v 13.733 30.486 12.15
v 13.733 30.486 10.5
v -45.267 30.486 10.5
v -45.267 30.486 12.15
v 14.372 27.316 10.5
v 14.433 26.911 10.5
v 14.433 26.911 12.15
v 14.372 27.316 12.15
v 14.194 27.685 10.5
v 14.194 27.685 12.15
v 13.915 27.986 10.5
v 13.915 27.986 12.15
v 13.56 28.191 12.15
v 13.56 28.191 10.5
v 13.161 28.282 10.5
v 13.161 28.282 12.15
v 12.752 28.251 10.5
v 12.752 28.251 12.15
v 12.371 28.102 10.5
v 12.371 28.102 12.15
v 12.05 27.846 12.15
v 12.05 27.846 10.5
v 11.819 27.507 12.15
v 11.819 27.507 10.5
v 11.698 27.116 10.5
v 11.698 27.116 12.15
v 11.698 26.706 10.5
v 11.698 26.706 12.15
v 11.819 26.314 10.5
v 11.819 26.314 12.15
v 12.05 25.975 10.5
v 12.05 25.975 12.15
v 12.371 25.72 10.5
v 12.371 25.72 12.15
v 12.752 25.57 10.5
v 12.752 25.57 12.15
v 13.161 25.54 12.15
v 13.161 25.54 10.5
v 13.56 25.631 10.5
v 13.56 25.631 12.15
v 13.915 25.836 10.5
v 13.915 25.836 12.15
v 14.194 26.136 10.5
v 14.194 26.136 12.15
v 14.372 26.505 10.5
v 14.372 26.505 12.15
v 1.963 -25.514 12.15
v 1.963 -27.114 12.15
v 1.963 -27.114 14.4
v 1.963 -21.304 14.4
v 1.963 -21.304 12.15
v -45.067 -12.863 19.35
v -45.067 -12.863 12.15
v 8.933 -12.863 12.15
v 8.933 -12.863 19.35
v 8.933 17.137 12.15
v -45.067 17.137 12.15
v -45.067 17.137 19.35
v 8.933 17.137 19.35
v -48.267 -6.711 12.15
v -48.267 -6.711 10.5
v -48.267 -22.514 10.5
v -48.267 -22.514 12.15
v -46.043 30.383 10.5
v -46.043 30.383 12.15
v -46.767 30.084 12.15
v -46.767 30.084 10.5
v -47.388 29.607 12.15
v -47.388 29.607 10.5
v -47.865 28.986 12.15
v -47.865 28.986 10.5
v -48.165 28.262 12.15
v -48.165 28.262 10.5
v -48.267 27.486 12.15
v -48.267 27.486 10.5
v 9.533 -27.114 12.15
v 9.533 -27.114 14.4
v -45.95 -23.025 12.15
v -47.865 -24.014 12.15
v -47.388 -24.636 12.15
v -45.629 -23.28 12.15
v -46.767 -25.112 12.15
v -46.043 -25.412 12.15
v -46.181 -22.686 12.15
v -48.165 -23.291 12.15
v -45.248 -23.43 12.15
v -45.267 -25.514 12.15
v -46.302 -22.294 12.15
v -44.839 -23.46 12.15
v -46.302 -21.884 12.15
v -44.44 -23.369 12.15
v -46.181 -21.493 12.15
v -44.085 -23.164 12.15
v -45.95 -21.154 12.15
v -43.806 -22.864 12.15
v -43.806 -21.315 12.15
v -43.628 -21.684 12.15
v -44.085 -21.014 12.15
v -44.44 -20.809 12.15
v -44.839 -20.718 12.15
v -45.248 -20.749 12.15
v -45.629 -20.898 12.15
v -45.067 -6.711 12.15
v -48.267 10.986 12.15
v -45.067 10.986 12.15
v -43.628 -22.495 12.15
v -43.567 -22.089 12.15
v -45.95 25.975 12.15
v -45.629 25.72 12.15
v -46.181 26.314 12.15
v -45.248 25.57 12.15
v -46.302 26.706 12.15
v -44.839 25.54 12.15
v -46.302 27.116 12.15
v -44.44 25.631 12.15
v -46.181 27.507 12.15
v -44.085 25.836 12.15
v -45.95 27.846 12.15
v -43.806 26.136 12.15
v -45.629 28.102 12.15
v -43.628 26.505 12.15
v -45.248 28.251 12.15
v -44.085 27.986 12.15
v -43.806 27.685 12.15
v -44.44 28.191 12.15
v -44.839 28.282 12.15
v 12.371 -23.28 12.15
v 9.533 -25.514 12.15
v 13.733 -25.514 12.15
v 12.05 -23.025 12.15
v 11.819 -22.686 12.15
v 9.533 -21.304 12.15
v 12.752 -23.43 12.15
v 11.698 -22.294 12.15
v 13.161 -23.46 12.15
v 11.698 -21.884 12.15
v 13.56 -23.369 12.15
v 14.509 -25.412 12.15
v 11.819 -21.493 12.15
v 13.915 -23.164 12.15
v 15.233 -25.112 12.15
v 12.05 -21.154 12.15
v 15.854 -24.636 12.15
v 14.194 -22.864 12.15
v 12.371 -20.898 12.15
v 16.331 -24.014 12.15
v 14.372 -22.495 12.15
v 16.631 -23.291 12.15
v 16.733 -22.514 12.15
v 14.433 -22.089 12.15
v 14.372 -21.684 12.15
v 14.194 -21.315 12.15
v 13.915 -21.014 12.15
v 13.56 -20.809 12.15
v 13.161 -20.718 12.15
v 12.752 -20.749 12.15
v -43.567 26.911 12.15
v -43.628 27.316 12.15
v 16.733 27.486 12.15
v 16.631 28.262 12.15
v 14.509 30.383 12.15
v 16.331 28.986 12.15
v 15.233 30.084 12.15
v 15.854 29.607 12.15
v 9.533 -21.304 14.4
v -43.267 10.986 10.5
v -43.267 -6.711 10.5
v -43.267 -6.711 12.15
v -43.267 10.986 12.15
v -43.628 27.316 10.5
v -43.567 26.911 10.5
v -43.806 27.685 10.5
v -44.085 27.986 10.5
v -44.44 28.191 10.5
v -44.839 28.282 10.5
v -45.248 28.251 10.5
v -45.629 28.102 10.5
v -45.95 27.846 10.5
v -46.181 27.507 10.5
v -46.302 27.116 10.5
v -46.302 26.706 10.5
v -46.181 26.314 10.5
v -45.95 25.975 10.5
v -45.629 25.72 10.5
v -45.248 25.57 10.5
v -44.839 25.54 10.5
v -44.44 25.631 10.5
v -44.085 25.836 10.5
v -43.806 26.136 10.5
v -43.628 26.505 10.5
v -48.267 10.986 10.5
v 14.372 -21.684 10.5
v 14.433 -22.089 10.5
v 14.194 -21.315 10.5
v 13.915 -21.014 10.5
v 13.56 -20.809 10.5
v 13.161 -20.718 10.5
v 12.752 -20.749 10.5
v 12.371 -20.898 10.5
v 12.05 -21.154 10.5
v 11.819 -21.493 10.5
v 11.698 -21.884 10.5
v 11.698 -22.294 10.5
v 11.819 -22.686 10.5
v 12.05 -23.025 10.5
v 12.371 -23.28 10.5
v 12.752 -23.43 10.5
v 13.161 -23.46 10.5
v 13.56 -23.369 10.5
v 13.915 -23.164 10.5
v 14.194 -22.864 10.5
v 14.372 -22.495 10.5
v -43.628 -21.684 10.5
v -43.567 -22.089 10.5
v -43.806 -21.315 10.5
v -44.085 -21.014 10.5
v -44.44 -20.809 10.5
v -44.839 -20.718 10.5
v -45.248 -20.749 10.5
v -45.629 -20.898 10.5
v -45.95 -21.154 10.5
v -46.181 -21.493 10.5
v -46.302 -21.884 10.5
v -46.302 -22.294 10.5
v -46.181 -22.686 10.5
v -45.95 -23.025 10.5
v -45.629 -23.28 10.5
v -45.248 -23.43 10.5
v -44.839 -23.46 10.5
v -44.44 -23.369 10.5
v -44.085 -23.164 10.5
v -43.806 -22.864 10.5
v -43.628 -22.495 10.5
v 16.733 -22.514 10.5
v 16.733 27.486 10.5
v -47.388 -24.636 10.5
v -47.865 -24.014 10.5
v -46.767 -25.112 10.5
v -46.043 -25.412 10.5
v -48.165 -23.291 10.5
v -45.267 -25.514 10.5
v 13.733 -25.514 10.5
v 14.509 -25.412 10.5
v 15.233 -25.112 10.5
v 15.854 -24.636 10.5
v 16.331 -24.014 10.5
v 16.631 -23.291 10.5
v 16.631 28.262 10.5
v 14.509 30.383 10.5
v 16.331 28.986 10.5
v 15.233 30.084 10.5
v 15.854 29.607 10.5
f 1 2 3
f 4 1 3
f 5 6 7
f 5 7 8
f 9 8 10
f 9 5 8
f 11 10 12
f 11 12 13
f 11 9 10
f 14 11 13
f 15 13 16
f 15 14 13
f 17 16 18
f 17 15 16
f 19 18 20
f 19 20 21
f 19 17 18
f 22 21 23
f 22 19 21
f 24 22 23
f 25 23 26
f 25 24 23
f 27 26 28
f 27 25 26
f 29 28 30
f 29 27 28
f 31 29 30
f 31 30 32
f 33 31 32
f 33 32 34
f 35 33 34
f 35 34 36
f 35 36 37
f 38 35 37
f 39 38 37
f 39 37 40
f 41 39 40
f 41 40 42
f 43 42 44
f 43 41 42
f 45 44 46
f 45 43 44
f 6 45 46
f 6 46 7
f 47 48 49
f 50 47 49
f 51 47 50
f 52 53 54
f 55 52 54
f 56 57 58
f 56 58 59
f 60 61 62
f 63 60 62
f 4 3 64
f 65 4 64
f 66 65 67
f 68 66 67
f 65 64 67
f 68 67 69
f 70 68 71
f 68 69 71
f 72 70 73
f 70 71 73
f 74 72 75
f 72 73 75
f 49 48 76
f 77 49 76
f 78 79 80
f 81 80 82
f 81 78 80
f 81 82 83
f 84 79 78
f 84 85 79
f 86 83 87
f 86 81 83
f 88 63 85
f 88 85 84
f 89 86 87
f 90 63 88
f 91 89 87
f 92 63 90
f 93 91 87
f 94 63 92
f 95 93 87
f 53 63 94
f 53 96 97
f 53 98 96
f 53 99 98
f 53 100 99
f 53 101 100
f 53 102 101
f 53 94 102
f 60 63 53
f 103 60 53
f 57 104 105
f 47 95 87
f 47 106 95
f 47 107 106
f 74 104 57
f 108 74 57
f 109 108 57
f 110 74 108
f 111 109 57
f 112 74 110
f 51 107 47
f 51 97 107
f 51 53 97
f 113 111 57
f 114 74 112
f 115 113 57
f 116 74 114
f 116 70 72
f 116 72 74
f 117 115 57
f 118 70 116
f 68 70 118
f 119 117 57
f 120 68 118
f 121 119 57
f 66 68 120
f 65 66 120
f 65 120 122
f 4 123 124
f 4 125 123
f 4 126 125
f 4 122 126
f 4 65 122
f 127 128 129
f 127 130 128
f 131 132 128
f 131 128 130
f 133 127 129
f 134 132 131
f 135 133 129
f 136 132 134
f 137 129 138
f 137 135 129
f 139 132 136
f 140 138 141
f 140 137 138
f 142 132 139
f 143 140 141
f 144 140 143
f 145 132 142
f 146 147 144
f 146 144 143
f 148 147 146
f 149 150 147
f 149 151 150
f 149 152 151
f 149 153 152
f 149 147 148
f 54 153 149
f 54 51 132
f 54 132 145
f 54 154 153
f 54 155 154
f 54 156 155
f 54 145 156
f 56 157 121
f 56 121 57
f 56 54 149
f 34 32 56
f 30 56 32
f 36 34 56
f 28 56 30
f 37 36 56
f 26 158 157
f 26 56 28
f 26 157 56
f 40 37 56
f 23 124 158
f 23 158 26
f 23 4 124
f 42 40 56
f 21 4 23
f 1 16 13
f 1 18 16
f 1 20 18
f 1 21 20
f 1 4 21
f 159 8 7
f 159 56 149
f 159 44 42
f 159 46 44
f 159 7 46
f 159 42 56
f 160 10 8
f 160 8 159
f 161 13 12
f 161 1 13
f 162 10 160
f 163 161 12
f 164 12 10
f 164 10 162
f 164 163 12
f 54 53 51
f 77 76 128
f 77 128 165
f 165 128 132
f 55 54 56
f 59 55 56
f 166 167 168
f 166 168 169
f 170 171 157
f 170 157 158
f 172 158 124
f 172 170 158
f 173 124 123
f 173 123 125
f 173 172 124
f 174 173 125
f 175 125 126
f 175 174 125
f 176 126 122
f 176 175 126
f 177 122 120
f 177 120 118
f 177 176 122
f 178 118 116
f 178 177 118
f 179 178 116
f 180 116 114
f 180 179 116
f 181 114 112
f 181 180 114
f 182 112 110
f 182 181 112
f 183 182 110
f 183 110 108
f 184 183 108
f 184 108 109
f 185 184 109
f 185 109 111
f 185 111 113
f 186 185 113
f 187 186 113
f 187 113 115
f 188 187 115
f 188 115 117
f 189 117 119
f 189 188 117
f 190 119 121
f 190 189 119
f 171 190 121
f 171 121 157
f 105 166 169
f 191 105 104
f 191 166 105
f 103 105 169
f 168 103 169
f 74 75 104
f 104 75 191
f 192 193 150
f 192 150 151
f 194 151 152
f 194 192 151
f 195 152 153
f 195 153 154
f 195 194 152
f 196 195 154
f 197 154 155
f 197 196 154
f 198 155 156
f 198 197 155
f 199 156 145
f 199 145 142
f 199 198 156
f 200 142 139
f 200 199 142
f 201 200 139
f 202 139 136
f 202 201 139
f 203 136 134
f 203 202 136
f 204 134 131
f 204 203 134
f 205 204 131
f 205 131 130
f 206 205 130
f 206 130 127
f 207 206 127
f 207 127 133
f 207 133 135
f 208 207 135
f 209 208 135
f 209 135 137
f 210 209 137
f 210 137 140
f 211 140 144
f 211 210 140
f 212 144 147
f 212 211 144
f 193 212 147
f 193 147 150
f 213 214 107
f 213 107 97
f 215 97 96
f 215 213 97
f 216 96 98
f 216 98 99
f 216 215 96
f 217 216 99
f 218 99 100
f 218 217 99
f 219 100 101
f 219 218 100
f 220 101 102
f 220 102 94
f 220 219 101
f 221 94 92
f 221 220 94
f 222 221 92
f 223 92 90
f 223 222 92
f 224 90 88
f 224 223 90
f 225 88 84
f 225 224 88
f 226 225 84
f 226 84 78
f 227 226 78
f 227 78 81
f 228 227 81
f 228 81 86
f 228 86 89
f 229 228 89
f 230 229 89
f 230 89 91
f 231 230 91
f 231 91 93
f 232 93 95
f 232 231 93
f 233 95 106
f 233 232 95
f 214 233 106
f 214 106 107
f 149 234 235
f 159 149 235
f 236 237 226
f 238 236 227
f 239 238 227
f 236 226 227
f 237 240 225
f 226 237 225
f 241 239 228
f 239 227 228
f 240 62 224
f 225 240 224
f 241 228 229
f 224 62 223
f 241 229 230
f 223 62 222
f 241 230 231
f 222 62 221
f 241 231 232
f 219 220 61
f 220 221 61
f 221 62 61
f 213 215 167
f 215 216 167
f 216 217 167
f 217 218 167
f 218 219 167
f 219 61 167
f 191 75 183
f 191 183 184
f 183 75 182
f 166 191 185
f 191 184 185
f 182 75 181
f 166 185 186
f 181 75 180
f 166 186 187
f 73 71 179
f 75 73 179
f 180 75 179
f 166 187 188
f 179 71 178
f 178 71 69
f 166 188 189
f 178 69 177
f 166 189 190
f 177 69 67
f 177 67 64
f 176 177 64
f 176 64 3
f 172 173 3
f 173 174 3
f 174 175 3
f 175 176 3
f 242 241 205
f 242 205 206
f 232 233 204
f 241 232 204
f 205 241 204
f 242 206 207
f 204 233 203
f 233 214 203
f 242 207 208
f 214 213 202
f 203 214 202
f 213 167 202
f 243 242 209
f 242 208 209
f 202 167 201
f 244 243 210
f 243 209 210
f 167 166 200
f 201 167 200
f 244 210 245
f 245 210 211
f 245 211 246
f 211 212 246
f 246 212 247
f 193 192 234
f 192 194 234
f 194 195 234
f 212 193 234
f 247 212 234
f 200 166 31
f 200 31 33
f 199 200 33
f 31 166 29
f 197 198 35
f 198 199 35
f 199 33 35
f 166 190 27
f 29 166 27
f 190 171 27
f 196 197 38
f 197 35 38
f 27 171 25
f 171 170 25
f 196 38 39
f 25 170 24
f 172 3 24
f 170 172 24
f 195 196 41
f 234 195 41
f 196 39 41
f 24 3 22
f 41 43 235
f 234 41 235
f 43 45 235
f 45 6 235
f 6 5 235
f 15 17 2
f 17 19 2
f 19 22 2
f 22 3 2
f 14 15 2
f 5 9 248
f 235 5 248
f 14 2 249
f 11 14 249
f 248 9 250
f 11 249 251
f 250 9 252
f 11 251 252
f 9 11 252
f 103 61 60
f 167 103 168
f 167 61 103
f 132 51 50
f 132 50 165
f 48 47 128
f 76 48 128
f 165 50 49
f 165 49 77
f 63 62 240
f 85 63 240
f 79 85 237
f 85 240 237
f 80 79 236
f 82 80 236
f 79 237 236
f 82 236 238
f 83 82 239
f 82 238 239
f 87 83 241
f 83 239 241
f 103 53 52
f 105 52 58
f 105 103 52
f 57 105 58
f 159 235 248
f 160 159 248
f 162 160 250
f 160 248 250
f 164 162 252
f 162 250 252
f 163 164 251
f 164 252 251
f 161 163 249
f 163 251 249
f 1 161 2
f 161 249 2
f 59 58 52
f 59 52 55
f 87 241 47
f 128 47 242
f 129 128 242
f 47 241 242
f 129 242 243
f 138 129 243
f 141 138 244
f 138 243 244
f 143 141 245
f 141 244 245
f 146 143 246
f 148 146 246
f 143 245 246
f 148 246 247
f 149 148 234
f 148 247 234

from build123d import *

# Parameters (mm, degrees)
SKETCH_R     = 1.375
PAD_DEPTH    = 1.65
SKETCH001_W  = 54
SKETCH001_H  = 30
PAD001_DEPTH = 7.2
SKETCH002_W  = 7.57
SKETCH002_H  = 5.81
PAD002_DEPTH = 2.25


with BuildPart() as part:
    # Sketch (on Face4 of Binder) → Pad (new body)
    with BuildSketch(Plane.XY.offset(10.5)):
        with BuildLine():
            Line((-48.266962, 27.485719), (-48.266962, 10.985719))
            Line((-43.266962, 10.985719), (-48.266962, 10.985719))
            Line((-43.266962, -6.711357), (-43.266962, 10.985719))
            Line((-48.266962, -6.711357), (-43.266962, -6.711357))
            Line((-48.266962, -6.711357), (-48.266967, -22.514281))
            ThreePointArc((-48.266967, -22.514281), (-47.388287, -24.635602), (-45.266967, -25.514281))
            Line((-45.266967, -25.514281), (13.733038, -25.514281))
            ThreePointArc((13.733038, -25.514281), (15.854358, -24.635602), (16.733038, -22.514281))
            Line((16.733038, -22.514281), (16.733038, 27.485719))
            ThreePointArc((16.733038, 27.485719), (15.854358, 29.607039), (13.733038, 30.485719))
            Line((13.733038, 30.485719), (-45.266962, 30.485719))
            ThreePointArc((-45.266962, 30.485719), (-47.388282, 29.607039), (-48.266962, 27.485719))
        make_face()
        with Locations((-44.941962, 26.910719)):
            Circle(SKETCH_R, mode=Mode.SUBTRACT)
        with Locations((13.058038, 26.910719)):
            Circle(SKETCH_R, mode=Mode.SUBTRACT)
        with Locations((13.058038, -22.089281)):
            Circle(SKETCH_R, mode=Mode.SUBTRACT)
        with Locations((-44.941962, -22.089281)):
            Circle(SKETCH_R, mode=Mode.SUBTRACT)
    extrude(amount=PAD_DEPTH)

    # Sketch001 (on Face18 of Pad) → Pad001 (join)
    with BuildSketch(Plane.XY.offset(12.15)):
        with Locations((-18.066962, 2.137181)):
            Rectangle(SKETCH001_W, SKETCH001_H)
    extrude(amount=PAD001_DEPTH)

    # Sketch002 (on Face5 of Pad001) → Pad002 (join)
    with BuildSketch(Plane.XY.offset(12.15)):
        with Locations((5.748038, -24.209281)):
            Rectangle(SKETCH002_W, SKETCH002_H)
    extrude(amount=PAD002_DEPTH)


solid = part.part
